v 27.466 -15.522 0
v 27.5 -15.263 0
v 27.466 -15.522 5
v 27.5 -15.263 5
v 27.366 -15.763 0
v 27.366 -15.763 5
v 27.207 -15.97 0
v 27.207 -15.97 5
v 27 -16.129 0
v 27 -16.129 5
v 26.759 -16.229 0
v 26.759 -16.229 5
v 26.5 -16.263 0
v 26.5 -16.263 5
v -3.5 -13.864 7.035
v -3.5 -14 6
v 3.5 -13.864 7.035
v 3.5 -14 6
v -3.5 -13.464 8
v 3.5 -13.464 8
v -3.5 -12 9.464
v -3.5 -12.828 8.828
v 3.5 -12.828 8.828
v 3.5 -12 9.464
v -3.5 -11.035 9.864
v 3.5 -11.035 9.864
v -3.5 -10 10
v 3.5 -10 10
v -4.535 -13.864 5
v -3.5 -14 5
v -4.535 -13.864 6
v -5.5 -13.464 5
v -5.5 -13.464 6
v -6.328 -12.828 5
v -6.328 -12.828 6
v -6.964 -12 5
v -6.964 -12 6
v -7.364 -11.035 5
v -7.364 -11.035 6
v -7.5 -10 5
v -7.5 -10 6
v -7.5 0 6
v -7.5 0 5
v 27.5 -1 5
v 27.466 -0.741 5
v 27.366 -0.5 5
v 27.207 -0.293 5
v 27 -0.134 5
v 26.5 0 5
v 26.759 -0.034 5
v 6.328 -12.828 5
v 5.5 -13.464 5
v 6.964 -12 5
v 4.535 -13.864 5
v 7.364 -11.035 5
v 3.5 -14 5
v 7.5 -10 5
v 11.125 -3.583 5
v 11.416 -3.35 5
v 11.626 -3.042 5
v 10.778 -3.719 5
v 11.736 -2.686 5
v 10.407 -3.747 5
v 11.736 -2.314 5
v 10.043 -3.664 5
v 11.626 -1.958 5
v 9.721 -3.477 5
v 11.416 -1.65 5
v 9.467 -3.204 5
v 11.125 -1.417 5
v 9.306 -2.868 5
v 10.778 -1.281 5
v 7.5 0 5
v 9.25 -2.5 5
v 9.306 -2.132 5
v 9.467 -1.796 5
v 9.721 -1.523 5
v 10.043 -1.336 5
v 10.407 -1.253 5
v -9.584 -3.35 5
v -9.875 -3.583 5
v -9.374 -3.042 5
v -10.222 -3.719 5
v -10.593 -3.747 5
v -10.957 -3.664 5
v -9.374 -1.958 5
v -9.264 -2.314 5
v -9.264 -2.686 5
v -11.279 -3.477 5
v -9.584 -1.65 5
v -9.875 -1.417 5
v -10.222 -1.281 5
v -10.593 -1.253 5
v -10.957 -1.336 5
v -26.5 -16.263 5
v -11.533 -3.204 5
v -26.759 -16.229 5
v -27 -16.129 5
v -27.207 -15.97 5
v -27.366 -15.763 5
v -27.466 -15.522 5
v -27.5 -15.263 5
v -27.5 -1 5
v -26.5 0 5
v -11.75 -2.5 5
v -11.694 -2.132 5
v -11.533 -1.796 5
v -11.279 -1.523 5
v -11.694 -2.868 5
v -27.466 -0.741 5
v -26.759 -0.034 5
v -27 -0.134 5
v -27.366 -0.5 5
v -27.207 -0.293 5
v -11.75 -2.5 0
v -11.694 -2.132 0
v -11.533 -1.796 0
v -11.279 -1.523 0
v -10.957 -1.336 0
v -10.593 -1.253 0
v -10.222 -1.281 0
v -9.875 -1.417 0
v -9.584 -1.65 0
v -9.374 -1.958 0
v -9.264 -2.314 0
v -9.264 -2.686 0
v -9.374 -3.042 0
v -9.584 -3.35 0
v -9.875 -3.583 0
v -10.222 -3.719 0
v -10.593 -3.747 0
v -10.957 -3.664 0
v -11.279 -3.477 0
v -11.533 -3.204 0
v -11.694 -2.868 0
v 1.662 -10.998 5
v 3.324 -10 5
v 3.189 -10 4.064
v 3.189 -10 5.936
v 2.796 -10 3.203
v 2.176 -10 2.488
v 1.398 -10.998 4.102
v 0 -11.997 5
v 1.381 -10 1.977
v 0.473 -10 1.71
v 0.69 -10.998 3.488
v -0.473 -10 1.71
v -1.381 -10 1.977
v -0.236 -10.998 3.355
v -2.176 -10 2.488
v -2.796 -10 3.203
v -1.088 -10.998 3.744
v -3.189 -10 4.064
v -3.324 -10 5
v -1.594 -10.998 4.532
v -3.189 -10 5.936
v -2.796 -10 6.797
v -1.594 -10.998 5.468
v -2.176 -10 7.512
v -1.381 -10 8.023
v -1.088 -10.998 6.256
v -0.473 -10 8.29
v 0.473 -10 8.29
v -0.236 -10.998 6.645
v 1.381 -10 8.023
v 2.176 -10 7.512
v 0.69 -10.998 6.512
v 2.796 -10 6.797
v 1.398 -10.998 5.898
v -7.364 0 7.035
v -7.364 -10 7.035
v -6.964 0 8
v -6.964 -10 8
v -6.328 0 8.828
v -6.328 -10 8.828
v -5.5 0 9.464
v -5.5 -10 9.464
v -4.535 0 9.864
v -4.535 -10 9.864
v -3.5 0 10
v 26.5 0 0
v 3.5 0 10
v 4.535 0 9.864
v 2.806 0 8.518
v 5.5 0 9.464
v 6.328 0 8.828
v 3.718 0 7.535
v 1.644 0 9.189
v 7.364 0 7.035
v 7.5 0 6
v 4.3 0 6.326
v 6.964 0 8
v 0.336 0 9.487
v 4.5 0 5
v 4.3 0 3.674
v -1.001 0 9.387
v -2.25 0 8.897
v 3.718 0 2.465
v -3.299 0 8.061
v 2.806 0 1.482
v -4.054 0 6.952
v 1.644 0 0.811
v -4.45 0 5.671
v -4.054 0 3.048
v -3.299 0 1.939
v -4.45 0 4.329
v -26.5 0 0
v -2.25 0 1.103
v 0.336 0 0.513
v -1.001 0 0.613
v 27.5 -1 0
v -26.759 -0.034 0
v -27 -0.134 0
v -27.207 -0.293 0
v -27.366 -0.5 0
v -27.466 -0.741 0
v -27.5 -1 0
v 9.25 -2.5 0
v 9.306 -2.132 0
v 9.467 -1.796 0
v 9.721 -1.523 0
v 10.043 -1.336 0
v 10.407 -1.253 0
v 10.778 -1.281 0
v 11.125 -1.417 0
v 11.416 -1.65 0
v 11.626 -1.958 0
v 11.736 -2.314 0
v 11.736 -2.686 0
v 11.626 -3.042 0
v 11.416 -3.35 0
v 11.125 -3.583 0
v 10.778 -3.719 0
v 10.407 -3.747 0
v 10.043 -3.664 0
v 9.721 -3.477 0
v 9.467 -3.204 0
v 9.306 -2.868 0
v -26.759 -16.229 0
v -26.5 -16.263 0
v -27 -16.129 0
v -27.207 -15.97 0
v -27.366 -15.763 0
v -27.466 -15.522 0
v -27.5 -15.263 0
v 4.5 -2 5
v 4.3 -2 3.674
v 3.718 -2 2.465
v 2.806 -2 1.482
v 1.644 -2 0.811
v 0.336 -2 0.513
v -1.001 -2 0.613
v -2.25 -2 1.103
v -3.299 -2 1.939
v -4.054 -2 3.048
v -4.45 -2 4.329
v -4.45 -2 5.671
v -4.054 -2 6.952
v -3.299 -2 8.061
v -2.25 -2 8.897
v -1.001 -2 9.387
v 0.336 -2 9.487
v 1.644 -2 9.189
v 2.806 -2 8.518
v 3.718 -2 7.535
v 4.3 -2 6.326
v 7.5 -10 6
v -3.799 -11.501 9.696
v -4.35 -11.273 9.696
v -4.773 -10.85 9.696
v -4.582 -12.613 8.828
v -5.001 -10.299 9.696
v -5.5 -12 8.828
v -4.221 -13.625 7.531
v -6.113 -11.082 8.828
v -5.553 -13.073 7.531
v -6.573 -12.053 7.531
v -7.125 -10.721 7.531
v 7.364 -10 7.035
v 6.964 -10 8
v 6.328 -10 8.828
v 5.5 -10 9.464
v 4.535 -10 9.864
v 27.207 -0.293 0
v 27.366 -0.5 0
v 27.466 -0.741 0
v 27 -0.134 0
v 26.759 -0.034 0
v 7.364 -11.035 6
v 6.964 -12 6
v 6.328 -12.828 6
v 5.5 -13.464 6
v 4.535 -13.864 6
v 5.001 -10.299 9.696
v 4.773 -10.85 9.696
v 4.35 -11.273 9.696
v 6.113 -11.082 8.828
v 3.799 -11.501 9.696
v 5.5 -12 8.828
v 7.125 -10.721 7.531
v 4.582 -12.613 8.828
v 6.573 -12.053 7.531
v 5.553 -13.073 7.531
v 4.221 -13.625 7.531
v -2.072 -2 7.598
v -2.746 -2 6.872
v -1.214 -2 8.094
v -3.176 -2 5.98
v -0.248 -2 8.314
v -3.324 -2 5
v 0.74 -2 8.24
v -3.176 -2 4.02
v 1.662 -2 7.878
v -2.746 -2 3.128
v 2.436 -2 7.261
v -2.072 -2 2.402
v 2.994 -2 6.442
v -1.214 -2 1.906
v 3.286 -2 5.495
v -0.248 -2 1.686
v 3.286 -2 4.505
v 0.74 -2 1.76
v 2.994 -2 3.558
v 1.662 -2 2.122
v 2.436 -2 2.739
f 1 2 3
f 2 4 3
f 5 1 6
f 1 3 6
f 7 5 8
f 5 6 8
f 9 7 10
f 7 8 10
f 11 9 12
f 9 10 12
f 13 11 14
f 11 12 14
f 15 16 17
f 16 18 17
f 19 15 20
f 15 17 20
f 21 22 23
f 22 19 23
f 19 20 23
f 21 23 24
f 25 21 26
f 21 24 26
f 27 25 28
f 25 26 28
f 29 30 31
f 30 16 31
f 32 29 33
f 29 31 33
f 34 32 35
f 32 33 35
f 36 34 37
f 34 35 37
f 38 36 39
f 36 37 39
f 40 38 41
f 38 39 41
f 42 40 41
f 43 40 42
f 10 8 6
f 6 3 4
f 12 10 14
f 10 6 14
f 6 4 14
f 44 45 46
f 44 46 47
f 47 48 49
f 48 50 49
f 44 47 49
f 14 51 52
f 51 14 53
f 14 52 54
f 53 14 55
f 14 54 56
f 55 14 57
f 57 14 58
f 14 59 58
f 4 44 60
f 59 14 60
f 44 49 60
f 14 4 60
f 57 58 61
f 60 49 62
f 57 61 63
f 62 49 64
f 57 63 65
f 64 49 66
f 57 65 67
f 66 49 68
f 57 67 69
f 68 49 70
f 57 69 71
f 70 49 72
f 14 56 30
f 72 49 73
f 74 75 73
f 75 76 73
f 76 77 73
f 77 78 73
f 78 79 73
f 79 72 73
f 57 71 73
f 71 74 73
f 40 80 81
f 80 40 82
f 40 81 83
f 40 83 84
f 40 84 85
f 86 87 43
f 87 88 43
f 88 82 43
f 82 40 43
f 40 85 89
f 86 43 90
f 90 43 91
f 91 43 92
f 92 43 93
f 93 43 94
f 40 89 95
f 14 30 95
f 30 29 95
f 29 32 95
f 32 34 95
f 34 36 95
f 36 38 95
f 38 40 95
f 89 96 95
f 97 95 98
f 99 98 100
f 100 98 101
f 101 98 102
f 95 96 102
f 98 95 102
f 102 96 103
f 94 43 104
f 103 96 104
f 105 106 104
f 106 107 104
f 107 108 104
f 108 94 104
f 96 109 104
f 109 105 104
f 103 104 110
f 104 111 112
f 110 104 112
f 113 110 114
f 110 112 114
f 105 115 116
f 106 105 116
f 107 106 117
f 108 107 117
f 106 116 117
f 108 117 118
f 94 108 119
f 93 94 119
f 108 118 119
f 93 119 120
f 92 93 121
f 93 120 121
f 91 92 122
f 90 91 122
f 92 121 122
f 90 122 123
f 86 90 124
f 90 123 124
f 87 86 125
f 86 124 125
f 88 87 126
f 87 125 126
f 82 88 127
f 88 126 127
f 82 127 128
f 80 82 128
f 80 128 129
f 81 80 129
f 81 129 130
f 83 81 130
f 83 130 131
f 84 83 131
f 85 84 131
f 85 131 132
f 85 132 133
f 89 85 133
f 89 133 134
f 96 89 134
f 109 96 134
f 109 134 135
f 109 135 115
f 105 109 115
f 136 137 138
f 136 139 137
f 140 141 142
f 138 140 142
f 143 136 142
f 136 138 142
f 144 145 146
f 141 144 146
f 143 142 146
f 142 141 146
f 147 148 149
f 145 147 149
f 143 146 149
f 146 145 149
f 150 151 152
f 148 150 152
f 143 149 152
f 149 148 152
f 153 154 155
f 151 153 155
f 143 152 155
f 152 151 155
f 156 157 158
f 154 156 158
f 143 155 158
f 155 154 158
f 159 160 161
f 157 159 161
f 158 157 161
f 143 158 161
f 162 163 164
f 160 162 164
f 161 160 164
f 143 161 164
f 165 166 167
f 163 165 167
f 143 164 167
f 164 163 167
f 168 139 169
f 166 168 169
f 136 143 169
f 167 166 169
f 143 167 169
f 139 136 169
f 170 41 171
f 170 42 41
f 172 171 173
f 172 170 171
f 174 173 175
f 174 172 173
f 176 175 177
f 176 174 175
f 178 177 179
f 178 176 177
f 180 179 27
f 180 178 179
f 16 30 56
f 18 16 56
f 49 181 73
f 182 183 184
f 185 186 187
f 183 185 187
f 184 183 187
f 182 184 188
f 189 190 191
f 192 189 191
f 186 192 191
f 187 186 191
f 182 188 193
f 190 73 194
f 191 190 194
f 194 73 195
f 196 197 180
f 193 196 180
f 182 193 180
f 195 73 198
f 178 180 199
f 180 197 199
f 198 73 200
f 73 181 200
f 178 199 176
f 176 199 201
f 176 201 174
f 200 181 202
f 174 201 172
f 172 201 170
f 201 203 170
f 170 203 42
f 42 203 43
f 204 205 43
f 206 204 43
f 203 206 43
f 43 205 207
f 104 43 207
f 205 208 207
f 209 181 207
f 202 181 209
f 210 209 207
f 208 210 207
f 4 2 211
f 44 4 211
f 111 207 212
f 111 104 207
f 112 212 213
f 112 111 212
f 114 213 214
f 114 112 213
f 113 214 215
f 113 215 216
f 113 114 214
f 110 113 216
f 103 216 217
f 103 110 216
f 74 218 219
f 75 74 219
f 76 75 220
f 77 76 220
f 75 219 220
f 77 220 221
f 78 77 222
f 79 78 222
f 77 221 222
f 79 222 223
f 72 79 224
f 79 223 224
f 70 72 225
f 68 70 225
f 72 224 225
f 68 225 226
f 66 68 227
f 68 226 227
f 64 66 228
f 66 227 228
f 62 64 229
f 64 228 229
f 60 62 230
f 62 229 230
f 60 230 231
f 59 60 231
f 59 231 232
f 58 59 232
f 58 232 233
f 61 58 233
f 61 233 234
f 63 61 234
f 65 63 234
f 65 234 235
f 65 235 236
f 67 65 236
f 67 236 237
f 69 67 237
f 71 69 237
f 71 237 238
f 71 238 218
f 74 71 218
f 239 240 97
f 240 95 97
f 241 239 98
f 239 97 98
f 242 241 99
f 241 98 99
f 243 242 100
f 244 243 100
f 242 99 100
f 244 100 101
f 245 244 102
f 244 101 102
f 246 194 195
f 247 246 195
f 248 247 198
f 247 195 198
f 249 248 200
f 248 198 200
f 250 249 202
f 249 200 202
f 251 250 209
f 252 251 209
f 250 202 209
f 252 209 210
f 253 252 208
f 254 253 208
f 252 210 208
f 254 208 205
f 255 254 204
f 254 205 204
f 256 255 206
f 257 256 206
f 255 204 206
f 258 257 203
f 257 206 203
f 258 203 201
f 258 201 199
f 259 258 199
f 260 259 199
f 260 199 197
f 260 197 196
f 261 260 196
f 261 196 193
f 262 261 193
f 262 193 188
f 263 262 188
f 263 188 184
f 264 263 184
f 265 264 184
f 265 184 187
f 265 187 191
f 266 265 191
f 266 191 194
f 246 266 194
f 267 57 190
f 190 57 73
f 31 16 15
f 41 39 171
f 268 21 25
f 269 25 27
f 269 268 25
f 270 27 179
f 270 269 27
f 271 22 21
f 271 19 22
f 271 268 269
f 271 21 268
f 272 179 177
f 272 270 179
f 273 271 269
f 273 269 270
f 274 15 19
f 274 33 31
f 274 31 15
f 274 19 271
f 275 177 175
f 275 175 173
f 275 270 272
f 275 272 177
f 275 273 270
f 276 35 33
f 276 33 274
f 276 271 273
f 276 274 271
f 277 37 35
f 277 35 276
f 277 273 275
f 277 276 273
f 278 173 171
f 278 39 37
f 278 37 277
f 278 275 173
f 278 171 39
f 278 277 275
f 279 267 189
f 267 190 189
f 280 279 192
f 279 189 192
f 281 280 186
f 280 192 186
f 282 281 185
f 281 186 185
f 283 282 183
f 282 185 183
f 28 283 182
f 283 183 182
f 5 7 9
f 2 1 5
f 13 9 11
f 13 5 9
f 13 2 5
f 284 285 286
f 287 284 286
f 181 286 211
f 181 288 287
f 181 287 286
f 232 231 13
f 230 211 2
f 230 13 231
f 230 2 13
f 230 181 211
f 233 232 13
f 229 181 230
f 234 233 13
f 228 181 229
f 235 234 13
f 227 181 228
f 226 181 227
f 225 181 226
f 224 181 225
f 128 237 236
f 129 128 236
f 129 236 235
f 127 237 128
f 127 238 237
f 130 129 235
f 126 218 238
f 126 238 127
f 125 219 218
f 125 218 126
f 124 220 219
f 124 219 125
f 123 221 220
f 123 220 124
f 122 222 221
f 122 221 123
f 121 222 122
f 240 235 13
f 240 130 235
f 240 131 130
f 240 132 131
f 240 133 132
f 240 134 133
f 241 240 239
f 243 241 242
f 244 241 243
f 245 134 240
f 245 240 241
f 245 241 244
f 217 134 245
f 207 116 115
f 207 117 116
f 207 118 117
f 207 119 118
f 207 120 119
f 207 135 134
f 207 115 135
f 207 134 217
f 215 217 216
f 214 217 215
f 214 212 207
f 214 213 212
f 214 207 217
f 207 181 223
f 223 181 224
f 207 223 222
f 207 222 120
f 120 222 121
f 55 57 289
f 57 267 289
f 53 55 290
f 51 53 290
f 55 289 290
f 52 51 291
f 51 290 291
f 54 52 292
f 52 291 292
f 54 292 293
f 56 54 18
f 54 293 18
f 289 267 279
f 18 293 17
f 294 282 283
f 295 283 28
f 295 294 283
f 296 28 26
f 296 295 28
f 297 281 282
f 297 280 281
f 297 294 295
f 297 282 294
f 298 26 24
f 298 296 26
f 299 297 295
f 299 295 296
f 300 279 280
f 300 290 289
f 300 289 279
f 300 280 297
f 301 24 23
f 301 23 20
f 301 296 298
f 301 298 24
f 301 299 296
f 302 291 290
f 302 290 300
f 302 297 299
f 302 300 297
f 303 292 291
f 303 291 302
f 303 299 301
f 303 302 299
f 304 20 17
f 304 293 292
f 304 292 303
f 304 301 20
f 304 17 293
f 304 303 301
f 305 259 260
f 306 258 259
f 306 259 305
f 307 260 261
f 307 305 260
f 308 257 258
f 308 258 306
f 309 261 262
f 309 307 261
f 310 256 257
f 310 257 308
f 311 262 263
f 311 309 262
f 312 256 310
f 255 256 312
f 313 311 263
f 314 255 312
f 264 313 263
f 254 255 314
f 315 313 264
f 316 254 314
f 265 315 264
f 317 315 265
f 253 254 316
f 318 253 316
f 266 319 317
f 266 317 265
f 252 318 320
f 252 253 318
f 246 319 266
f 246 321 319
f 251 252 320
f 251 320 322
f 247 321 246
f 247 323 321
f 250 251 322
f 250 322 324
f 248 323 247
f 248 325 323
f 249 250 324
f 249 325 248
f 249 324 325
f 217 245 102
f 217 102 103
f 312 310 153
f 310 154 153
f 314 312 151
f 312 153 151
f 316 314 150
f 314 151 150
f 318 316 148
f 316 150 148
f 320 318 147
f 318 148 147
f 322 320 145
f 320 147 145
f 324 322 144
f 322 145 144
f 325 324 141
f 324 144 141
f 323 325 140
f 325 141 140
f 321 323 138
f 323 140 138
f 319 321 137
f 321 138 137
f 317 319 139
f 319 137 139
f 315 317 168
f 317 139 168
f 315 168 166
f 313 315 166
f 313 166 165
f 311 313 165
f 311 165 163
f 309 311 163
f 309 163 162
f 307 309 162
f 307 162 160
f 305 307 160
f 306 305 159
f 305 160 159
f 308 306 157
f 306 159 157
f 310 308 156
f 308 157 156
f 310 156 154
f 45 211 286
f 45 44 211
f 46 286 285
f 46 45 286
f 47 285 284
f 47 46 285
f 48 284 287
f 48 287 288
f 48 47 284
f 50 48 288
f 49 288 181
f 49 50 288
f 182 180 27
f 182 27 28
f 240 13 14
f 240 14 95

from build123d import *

# Parameters (mm, degrees)
SKETCH1_W                               = 55.000000074
SKETCH1_H                               = 16.2630756
BOSS_EXTRUDE1_DEPTH                     = 5
SKETCH4_W                               = 15
SKETCH4_H                               = 14
BOSS_EXTRUDE2_DEPTH                     = 5
CBORE_FOR_M6_HEX_HEAD_BOLT1_D           = 6.647
CBORE_FOR_M6_HEX_HEAD_BOLT1_DEPTH       = 10
CBORE_FOR_M6_HEX_HEAD_BOLT1_CBORE_D     = 9
CBORE_FOR_M6_HEX_HEAD_BOLT1_CBORE_DEPTH = 2
CBORE_FOR_M6_HEX_HEAD_BOLT1_TIP         = 1.996960267
FILLET1_R                               = 1
FILLET2_R                               = 4
TAP_DRILL_FOR_M3X0_5_TAP1_D             = 2.5


with BuildPart() as part:
    # Sketch1 → Boss-Extrude1 (new body)
    with BuildSketch(Plane(origin=(0, 0, 0), x_dir=(-1, 0, 0), z_dir=(0, 0, -1))):
        with Locations((3.7e-08, -8.131537807)):
            Rectangle(SKETCH1_W, SKETCH1_H)
    extrude(amount=-BOSS_EXTRUDE1_DEPTH)

    # Sketch4 → Boss-Extrude2 (add)
    with BuildSketch(Plane.XY.offset(5)):
        with Locations((0, -7)):
            Rectangle(SKETCH4_W, SKETCH4_H)
    extrude(amount=BOSS_EXTRUDE2_DEPTH)

    # CBORE for M6 Hex Head Bolt1
    with Locations(Plane(origin=(0, 0, 0), x_dir=(1, 0, 0), z_dir=(0, 1, 0))):
        with Locations((0, -5)):
            CounterBoreHole(CBORE_FOR_M6_HEX_HEAD_BOLT1_D / 2, CBORE_FOR_M6_HEX_HEAD_BOLT1_CBORE_D / 2, CBORE_FOR_M6_HEX_HEAD_BOLT1_CBORE_DEPTH, depth=CBORE_FOR_M6_HEX_HEAD_BOLT1_DEPTH)
            with Locations((0, 0, -(CBORE_FOR_M6_HEX_HEAD_BOLT1_DEPTH + CBORE_FOR_M6_HEX_HEAD_BOLT1_TIP / 2))):  # 118° drill point
                Cone(0, CBORE_FOR_M6_HEX_HEAD_BOLT1_D / 2, CBORE_FOR_M6_HEX_HEAD_BOLT1_TIP, mode=Mode.SUBTRACT)

    # Fillet1
    fillet1_edges = [part.edges().sort_by_distance(p)[0] for p in [
        (27.5, -7e-09, 2.5),
        (-27.500000074, -7e-09, 2.5),
        (27.5, -16.263075607, 2.5),
        (-27.500000074, -16.263075607, 2.5),
    ]]
    fillet(fillet1_edges, radius=FILLET1_R)

    # Fillet2
    fillet2_edges = [part.edges().sort_by_distance(p)[0] for p in [
        (7.5, -14, 7.5),
        (7.5, -7, 10),
        (-7.5, -14, 7.5),
        (0, -14, 10),
        (-7.5, -7, 10),
    ]]
    fillet(fillet2_edges, radius=FILLET2_R)

    # Tap Drill for M3x0.5 Tap1 (through all)
    with Locations(Plane(origin=(-10.5, -2.500000007, 5), x_dir=(1, 0, 0), z_dir=(0, 0, 1))):
        with Locations((0, 0), (21, 0)):
            Hole(TAP_DRILL_FOR_M3X0_5_TAP1_D / 2)


solid = part.part
